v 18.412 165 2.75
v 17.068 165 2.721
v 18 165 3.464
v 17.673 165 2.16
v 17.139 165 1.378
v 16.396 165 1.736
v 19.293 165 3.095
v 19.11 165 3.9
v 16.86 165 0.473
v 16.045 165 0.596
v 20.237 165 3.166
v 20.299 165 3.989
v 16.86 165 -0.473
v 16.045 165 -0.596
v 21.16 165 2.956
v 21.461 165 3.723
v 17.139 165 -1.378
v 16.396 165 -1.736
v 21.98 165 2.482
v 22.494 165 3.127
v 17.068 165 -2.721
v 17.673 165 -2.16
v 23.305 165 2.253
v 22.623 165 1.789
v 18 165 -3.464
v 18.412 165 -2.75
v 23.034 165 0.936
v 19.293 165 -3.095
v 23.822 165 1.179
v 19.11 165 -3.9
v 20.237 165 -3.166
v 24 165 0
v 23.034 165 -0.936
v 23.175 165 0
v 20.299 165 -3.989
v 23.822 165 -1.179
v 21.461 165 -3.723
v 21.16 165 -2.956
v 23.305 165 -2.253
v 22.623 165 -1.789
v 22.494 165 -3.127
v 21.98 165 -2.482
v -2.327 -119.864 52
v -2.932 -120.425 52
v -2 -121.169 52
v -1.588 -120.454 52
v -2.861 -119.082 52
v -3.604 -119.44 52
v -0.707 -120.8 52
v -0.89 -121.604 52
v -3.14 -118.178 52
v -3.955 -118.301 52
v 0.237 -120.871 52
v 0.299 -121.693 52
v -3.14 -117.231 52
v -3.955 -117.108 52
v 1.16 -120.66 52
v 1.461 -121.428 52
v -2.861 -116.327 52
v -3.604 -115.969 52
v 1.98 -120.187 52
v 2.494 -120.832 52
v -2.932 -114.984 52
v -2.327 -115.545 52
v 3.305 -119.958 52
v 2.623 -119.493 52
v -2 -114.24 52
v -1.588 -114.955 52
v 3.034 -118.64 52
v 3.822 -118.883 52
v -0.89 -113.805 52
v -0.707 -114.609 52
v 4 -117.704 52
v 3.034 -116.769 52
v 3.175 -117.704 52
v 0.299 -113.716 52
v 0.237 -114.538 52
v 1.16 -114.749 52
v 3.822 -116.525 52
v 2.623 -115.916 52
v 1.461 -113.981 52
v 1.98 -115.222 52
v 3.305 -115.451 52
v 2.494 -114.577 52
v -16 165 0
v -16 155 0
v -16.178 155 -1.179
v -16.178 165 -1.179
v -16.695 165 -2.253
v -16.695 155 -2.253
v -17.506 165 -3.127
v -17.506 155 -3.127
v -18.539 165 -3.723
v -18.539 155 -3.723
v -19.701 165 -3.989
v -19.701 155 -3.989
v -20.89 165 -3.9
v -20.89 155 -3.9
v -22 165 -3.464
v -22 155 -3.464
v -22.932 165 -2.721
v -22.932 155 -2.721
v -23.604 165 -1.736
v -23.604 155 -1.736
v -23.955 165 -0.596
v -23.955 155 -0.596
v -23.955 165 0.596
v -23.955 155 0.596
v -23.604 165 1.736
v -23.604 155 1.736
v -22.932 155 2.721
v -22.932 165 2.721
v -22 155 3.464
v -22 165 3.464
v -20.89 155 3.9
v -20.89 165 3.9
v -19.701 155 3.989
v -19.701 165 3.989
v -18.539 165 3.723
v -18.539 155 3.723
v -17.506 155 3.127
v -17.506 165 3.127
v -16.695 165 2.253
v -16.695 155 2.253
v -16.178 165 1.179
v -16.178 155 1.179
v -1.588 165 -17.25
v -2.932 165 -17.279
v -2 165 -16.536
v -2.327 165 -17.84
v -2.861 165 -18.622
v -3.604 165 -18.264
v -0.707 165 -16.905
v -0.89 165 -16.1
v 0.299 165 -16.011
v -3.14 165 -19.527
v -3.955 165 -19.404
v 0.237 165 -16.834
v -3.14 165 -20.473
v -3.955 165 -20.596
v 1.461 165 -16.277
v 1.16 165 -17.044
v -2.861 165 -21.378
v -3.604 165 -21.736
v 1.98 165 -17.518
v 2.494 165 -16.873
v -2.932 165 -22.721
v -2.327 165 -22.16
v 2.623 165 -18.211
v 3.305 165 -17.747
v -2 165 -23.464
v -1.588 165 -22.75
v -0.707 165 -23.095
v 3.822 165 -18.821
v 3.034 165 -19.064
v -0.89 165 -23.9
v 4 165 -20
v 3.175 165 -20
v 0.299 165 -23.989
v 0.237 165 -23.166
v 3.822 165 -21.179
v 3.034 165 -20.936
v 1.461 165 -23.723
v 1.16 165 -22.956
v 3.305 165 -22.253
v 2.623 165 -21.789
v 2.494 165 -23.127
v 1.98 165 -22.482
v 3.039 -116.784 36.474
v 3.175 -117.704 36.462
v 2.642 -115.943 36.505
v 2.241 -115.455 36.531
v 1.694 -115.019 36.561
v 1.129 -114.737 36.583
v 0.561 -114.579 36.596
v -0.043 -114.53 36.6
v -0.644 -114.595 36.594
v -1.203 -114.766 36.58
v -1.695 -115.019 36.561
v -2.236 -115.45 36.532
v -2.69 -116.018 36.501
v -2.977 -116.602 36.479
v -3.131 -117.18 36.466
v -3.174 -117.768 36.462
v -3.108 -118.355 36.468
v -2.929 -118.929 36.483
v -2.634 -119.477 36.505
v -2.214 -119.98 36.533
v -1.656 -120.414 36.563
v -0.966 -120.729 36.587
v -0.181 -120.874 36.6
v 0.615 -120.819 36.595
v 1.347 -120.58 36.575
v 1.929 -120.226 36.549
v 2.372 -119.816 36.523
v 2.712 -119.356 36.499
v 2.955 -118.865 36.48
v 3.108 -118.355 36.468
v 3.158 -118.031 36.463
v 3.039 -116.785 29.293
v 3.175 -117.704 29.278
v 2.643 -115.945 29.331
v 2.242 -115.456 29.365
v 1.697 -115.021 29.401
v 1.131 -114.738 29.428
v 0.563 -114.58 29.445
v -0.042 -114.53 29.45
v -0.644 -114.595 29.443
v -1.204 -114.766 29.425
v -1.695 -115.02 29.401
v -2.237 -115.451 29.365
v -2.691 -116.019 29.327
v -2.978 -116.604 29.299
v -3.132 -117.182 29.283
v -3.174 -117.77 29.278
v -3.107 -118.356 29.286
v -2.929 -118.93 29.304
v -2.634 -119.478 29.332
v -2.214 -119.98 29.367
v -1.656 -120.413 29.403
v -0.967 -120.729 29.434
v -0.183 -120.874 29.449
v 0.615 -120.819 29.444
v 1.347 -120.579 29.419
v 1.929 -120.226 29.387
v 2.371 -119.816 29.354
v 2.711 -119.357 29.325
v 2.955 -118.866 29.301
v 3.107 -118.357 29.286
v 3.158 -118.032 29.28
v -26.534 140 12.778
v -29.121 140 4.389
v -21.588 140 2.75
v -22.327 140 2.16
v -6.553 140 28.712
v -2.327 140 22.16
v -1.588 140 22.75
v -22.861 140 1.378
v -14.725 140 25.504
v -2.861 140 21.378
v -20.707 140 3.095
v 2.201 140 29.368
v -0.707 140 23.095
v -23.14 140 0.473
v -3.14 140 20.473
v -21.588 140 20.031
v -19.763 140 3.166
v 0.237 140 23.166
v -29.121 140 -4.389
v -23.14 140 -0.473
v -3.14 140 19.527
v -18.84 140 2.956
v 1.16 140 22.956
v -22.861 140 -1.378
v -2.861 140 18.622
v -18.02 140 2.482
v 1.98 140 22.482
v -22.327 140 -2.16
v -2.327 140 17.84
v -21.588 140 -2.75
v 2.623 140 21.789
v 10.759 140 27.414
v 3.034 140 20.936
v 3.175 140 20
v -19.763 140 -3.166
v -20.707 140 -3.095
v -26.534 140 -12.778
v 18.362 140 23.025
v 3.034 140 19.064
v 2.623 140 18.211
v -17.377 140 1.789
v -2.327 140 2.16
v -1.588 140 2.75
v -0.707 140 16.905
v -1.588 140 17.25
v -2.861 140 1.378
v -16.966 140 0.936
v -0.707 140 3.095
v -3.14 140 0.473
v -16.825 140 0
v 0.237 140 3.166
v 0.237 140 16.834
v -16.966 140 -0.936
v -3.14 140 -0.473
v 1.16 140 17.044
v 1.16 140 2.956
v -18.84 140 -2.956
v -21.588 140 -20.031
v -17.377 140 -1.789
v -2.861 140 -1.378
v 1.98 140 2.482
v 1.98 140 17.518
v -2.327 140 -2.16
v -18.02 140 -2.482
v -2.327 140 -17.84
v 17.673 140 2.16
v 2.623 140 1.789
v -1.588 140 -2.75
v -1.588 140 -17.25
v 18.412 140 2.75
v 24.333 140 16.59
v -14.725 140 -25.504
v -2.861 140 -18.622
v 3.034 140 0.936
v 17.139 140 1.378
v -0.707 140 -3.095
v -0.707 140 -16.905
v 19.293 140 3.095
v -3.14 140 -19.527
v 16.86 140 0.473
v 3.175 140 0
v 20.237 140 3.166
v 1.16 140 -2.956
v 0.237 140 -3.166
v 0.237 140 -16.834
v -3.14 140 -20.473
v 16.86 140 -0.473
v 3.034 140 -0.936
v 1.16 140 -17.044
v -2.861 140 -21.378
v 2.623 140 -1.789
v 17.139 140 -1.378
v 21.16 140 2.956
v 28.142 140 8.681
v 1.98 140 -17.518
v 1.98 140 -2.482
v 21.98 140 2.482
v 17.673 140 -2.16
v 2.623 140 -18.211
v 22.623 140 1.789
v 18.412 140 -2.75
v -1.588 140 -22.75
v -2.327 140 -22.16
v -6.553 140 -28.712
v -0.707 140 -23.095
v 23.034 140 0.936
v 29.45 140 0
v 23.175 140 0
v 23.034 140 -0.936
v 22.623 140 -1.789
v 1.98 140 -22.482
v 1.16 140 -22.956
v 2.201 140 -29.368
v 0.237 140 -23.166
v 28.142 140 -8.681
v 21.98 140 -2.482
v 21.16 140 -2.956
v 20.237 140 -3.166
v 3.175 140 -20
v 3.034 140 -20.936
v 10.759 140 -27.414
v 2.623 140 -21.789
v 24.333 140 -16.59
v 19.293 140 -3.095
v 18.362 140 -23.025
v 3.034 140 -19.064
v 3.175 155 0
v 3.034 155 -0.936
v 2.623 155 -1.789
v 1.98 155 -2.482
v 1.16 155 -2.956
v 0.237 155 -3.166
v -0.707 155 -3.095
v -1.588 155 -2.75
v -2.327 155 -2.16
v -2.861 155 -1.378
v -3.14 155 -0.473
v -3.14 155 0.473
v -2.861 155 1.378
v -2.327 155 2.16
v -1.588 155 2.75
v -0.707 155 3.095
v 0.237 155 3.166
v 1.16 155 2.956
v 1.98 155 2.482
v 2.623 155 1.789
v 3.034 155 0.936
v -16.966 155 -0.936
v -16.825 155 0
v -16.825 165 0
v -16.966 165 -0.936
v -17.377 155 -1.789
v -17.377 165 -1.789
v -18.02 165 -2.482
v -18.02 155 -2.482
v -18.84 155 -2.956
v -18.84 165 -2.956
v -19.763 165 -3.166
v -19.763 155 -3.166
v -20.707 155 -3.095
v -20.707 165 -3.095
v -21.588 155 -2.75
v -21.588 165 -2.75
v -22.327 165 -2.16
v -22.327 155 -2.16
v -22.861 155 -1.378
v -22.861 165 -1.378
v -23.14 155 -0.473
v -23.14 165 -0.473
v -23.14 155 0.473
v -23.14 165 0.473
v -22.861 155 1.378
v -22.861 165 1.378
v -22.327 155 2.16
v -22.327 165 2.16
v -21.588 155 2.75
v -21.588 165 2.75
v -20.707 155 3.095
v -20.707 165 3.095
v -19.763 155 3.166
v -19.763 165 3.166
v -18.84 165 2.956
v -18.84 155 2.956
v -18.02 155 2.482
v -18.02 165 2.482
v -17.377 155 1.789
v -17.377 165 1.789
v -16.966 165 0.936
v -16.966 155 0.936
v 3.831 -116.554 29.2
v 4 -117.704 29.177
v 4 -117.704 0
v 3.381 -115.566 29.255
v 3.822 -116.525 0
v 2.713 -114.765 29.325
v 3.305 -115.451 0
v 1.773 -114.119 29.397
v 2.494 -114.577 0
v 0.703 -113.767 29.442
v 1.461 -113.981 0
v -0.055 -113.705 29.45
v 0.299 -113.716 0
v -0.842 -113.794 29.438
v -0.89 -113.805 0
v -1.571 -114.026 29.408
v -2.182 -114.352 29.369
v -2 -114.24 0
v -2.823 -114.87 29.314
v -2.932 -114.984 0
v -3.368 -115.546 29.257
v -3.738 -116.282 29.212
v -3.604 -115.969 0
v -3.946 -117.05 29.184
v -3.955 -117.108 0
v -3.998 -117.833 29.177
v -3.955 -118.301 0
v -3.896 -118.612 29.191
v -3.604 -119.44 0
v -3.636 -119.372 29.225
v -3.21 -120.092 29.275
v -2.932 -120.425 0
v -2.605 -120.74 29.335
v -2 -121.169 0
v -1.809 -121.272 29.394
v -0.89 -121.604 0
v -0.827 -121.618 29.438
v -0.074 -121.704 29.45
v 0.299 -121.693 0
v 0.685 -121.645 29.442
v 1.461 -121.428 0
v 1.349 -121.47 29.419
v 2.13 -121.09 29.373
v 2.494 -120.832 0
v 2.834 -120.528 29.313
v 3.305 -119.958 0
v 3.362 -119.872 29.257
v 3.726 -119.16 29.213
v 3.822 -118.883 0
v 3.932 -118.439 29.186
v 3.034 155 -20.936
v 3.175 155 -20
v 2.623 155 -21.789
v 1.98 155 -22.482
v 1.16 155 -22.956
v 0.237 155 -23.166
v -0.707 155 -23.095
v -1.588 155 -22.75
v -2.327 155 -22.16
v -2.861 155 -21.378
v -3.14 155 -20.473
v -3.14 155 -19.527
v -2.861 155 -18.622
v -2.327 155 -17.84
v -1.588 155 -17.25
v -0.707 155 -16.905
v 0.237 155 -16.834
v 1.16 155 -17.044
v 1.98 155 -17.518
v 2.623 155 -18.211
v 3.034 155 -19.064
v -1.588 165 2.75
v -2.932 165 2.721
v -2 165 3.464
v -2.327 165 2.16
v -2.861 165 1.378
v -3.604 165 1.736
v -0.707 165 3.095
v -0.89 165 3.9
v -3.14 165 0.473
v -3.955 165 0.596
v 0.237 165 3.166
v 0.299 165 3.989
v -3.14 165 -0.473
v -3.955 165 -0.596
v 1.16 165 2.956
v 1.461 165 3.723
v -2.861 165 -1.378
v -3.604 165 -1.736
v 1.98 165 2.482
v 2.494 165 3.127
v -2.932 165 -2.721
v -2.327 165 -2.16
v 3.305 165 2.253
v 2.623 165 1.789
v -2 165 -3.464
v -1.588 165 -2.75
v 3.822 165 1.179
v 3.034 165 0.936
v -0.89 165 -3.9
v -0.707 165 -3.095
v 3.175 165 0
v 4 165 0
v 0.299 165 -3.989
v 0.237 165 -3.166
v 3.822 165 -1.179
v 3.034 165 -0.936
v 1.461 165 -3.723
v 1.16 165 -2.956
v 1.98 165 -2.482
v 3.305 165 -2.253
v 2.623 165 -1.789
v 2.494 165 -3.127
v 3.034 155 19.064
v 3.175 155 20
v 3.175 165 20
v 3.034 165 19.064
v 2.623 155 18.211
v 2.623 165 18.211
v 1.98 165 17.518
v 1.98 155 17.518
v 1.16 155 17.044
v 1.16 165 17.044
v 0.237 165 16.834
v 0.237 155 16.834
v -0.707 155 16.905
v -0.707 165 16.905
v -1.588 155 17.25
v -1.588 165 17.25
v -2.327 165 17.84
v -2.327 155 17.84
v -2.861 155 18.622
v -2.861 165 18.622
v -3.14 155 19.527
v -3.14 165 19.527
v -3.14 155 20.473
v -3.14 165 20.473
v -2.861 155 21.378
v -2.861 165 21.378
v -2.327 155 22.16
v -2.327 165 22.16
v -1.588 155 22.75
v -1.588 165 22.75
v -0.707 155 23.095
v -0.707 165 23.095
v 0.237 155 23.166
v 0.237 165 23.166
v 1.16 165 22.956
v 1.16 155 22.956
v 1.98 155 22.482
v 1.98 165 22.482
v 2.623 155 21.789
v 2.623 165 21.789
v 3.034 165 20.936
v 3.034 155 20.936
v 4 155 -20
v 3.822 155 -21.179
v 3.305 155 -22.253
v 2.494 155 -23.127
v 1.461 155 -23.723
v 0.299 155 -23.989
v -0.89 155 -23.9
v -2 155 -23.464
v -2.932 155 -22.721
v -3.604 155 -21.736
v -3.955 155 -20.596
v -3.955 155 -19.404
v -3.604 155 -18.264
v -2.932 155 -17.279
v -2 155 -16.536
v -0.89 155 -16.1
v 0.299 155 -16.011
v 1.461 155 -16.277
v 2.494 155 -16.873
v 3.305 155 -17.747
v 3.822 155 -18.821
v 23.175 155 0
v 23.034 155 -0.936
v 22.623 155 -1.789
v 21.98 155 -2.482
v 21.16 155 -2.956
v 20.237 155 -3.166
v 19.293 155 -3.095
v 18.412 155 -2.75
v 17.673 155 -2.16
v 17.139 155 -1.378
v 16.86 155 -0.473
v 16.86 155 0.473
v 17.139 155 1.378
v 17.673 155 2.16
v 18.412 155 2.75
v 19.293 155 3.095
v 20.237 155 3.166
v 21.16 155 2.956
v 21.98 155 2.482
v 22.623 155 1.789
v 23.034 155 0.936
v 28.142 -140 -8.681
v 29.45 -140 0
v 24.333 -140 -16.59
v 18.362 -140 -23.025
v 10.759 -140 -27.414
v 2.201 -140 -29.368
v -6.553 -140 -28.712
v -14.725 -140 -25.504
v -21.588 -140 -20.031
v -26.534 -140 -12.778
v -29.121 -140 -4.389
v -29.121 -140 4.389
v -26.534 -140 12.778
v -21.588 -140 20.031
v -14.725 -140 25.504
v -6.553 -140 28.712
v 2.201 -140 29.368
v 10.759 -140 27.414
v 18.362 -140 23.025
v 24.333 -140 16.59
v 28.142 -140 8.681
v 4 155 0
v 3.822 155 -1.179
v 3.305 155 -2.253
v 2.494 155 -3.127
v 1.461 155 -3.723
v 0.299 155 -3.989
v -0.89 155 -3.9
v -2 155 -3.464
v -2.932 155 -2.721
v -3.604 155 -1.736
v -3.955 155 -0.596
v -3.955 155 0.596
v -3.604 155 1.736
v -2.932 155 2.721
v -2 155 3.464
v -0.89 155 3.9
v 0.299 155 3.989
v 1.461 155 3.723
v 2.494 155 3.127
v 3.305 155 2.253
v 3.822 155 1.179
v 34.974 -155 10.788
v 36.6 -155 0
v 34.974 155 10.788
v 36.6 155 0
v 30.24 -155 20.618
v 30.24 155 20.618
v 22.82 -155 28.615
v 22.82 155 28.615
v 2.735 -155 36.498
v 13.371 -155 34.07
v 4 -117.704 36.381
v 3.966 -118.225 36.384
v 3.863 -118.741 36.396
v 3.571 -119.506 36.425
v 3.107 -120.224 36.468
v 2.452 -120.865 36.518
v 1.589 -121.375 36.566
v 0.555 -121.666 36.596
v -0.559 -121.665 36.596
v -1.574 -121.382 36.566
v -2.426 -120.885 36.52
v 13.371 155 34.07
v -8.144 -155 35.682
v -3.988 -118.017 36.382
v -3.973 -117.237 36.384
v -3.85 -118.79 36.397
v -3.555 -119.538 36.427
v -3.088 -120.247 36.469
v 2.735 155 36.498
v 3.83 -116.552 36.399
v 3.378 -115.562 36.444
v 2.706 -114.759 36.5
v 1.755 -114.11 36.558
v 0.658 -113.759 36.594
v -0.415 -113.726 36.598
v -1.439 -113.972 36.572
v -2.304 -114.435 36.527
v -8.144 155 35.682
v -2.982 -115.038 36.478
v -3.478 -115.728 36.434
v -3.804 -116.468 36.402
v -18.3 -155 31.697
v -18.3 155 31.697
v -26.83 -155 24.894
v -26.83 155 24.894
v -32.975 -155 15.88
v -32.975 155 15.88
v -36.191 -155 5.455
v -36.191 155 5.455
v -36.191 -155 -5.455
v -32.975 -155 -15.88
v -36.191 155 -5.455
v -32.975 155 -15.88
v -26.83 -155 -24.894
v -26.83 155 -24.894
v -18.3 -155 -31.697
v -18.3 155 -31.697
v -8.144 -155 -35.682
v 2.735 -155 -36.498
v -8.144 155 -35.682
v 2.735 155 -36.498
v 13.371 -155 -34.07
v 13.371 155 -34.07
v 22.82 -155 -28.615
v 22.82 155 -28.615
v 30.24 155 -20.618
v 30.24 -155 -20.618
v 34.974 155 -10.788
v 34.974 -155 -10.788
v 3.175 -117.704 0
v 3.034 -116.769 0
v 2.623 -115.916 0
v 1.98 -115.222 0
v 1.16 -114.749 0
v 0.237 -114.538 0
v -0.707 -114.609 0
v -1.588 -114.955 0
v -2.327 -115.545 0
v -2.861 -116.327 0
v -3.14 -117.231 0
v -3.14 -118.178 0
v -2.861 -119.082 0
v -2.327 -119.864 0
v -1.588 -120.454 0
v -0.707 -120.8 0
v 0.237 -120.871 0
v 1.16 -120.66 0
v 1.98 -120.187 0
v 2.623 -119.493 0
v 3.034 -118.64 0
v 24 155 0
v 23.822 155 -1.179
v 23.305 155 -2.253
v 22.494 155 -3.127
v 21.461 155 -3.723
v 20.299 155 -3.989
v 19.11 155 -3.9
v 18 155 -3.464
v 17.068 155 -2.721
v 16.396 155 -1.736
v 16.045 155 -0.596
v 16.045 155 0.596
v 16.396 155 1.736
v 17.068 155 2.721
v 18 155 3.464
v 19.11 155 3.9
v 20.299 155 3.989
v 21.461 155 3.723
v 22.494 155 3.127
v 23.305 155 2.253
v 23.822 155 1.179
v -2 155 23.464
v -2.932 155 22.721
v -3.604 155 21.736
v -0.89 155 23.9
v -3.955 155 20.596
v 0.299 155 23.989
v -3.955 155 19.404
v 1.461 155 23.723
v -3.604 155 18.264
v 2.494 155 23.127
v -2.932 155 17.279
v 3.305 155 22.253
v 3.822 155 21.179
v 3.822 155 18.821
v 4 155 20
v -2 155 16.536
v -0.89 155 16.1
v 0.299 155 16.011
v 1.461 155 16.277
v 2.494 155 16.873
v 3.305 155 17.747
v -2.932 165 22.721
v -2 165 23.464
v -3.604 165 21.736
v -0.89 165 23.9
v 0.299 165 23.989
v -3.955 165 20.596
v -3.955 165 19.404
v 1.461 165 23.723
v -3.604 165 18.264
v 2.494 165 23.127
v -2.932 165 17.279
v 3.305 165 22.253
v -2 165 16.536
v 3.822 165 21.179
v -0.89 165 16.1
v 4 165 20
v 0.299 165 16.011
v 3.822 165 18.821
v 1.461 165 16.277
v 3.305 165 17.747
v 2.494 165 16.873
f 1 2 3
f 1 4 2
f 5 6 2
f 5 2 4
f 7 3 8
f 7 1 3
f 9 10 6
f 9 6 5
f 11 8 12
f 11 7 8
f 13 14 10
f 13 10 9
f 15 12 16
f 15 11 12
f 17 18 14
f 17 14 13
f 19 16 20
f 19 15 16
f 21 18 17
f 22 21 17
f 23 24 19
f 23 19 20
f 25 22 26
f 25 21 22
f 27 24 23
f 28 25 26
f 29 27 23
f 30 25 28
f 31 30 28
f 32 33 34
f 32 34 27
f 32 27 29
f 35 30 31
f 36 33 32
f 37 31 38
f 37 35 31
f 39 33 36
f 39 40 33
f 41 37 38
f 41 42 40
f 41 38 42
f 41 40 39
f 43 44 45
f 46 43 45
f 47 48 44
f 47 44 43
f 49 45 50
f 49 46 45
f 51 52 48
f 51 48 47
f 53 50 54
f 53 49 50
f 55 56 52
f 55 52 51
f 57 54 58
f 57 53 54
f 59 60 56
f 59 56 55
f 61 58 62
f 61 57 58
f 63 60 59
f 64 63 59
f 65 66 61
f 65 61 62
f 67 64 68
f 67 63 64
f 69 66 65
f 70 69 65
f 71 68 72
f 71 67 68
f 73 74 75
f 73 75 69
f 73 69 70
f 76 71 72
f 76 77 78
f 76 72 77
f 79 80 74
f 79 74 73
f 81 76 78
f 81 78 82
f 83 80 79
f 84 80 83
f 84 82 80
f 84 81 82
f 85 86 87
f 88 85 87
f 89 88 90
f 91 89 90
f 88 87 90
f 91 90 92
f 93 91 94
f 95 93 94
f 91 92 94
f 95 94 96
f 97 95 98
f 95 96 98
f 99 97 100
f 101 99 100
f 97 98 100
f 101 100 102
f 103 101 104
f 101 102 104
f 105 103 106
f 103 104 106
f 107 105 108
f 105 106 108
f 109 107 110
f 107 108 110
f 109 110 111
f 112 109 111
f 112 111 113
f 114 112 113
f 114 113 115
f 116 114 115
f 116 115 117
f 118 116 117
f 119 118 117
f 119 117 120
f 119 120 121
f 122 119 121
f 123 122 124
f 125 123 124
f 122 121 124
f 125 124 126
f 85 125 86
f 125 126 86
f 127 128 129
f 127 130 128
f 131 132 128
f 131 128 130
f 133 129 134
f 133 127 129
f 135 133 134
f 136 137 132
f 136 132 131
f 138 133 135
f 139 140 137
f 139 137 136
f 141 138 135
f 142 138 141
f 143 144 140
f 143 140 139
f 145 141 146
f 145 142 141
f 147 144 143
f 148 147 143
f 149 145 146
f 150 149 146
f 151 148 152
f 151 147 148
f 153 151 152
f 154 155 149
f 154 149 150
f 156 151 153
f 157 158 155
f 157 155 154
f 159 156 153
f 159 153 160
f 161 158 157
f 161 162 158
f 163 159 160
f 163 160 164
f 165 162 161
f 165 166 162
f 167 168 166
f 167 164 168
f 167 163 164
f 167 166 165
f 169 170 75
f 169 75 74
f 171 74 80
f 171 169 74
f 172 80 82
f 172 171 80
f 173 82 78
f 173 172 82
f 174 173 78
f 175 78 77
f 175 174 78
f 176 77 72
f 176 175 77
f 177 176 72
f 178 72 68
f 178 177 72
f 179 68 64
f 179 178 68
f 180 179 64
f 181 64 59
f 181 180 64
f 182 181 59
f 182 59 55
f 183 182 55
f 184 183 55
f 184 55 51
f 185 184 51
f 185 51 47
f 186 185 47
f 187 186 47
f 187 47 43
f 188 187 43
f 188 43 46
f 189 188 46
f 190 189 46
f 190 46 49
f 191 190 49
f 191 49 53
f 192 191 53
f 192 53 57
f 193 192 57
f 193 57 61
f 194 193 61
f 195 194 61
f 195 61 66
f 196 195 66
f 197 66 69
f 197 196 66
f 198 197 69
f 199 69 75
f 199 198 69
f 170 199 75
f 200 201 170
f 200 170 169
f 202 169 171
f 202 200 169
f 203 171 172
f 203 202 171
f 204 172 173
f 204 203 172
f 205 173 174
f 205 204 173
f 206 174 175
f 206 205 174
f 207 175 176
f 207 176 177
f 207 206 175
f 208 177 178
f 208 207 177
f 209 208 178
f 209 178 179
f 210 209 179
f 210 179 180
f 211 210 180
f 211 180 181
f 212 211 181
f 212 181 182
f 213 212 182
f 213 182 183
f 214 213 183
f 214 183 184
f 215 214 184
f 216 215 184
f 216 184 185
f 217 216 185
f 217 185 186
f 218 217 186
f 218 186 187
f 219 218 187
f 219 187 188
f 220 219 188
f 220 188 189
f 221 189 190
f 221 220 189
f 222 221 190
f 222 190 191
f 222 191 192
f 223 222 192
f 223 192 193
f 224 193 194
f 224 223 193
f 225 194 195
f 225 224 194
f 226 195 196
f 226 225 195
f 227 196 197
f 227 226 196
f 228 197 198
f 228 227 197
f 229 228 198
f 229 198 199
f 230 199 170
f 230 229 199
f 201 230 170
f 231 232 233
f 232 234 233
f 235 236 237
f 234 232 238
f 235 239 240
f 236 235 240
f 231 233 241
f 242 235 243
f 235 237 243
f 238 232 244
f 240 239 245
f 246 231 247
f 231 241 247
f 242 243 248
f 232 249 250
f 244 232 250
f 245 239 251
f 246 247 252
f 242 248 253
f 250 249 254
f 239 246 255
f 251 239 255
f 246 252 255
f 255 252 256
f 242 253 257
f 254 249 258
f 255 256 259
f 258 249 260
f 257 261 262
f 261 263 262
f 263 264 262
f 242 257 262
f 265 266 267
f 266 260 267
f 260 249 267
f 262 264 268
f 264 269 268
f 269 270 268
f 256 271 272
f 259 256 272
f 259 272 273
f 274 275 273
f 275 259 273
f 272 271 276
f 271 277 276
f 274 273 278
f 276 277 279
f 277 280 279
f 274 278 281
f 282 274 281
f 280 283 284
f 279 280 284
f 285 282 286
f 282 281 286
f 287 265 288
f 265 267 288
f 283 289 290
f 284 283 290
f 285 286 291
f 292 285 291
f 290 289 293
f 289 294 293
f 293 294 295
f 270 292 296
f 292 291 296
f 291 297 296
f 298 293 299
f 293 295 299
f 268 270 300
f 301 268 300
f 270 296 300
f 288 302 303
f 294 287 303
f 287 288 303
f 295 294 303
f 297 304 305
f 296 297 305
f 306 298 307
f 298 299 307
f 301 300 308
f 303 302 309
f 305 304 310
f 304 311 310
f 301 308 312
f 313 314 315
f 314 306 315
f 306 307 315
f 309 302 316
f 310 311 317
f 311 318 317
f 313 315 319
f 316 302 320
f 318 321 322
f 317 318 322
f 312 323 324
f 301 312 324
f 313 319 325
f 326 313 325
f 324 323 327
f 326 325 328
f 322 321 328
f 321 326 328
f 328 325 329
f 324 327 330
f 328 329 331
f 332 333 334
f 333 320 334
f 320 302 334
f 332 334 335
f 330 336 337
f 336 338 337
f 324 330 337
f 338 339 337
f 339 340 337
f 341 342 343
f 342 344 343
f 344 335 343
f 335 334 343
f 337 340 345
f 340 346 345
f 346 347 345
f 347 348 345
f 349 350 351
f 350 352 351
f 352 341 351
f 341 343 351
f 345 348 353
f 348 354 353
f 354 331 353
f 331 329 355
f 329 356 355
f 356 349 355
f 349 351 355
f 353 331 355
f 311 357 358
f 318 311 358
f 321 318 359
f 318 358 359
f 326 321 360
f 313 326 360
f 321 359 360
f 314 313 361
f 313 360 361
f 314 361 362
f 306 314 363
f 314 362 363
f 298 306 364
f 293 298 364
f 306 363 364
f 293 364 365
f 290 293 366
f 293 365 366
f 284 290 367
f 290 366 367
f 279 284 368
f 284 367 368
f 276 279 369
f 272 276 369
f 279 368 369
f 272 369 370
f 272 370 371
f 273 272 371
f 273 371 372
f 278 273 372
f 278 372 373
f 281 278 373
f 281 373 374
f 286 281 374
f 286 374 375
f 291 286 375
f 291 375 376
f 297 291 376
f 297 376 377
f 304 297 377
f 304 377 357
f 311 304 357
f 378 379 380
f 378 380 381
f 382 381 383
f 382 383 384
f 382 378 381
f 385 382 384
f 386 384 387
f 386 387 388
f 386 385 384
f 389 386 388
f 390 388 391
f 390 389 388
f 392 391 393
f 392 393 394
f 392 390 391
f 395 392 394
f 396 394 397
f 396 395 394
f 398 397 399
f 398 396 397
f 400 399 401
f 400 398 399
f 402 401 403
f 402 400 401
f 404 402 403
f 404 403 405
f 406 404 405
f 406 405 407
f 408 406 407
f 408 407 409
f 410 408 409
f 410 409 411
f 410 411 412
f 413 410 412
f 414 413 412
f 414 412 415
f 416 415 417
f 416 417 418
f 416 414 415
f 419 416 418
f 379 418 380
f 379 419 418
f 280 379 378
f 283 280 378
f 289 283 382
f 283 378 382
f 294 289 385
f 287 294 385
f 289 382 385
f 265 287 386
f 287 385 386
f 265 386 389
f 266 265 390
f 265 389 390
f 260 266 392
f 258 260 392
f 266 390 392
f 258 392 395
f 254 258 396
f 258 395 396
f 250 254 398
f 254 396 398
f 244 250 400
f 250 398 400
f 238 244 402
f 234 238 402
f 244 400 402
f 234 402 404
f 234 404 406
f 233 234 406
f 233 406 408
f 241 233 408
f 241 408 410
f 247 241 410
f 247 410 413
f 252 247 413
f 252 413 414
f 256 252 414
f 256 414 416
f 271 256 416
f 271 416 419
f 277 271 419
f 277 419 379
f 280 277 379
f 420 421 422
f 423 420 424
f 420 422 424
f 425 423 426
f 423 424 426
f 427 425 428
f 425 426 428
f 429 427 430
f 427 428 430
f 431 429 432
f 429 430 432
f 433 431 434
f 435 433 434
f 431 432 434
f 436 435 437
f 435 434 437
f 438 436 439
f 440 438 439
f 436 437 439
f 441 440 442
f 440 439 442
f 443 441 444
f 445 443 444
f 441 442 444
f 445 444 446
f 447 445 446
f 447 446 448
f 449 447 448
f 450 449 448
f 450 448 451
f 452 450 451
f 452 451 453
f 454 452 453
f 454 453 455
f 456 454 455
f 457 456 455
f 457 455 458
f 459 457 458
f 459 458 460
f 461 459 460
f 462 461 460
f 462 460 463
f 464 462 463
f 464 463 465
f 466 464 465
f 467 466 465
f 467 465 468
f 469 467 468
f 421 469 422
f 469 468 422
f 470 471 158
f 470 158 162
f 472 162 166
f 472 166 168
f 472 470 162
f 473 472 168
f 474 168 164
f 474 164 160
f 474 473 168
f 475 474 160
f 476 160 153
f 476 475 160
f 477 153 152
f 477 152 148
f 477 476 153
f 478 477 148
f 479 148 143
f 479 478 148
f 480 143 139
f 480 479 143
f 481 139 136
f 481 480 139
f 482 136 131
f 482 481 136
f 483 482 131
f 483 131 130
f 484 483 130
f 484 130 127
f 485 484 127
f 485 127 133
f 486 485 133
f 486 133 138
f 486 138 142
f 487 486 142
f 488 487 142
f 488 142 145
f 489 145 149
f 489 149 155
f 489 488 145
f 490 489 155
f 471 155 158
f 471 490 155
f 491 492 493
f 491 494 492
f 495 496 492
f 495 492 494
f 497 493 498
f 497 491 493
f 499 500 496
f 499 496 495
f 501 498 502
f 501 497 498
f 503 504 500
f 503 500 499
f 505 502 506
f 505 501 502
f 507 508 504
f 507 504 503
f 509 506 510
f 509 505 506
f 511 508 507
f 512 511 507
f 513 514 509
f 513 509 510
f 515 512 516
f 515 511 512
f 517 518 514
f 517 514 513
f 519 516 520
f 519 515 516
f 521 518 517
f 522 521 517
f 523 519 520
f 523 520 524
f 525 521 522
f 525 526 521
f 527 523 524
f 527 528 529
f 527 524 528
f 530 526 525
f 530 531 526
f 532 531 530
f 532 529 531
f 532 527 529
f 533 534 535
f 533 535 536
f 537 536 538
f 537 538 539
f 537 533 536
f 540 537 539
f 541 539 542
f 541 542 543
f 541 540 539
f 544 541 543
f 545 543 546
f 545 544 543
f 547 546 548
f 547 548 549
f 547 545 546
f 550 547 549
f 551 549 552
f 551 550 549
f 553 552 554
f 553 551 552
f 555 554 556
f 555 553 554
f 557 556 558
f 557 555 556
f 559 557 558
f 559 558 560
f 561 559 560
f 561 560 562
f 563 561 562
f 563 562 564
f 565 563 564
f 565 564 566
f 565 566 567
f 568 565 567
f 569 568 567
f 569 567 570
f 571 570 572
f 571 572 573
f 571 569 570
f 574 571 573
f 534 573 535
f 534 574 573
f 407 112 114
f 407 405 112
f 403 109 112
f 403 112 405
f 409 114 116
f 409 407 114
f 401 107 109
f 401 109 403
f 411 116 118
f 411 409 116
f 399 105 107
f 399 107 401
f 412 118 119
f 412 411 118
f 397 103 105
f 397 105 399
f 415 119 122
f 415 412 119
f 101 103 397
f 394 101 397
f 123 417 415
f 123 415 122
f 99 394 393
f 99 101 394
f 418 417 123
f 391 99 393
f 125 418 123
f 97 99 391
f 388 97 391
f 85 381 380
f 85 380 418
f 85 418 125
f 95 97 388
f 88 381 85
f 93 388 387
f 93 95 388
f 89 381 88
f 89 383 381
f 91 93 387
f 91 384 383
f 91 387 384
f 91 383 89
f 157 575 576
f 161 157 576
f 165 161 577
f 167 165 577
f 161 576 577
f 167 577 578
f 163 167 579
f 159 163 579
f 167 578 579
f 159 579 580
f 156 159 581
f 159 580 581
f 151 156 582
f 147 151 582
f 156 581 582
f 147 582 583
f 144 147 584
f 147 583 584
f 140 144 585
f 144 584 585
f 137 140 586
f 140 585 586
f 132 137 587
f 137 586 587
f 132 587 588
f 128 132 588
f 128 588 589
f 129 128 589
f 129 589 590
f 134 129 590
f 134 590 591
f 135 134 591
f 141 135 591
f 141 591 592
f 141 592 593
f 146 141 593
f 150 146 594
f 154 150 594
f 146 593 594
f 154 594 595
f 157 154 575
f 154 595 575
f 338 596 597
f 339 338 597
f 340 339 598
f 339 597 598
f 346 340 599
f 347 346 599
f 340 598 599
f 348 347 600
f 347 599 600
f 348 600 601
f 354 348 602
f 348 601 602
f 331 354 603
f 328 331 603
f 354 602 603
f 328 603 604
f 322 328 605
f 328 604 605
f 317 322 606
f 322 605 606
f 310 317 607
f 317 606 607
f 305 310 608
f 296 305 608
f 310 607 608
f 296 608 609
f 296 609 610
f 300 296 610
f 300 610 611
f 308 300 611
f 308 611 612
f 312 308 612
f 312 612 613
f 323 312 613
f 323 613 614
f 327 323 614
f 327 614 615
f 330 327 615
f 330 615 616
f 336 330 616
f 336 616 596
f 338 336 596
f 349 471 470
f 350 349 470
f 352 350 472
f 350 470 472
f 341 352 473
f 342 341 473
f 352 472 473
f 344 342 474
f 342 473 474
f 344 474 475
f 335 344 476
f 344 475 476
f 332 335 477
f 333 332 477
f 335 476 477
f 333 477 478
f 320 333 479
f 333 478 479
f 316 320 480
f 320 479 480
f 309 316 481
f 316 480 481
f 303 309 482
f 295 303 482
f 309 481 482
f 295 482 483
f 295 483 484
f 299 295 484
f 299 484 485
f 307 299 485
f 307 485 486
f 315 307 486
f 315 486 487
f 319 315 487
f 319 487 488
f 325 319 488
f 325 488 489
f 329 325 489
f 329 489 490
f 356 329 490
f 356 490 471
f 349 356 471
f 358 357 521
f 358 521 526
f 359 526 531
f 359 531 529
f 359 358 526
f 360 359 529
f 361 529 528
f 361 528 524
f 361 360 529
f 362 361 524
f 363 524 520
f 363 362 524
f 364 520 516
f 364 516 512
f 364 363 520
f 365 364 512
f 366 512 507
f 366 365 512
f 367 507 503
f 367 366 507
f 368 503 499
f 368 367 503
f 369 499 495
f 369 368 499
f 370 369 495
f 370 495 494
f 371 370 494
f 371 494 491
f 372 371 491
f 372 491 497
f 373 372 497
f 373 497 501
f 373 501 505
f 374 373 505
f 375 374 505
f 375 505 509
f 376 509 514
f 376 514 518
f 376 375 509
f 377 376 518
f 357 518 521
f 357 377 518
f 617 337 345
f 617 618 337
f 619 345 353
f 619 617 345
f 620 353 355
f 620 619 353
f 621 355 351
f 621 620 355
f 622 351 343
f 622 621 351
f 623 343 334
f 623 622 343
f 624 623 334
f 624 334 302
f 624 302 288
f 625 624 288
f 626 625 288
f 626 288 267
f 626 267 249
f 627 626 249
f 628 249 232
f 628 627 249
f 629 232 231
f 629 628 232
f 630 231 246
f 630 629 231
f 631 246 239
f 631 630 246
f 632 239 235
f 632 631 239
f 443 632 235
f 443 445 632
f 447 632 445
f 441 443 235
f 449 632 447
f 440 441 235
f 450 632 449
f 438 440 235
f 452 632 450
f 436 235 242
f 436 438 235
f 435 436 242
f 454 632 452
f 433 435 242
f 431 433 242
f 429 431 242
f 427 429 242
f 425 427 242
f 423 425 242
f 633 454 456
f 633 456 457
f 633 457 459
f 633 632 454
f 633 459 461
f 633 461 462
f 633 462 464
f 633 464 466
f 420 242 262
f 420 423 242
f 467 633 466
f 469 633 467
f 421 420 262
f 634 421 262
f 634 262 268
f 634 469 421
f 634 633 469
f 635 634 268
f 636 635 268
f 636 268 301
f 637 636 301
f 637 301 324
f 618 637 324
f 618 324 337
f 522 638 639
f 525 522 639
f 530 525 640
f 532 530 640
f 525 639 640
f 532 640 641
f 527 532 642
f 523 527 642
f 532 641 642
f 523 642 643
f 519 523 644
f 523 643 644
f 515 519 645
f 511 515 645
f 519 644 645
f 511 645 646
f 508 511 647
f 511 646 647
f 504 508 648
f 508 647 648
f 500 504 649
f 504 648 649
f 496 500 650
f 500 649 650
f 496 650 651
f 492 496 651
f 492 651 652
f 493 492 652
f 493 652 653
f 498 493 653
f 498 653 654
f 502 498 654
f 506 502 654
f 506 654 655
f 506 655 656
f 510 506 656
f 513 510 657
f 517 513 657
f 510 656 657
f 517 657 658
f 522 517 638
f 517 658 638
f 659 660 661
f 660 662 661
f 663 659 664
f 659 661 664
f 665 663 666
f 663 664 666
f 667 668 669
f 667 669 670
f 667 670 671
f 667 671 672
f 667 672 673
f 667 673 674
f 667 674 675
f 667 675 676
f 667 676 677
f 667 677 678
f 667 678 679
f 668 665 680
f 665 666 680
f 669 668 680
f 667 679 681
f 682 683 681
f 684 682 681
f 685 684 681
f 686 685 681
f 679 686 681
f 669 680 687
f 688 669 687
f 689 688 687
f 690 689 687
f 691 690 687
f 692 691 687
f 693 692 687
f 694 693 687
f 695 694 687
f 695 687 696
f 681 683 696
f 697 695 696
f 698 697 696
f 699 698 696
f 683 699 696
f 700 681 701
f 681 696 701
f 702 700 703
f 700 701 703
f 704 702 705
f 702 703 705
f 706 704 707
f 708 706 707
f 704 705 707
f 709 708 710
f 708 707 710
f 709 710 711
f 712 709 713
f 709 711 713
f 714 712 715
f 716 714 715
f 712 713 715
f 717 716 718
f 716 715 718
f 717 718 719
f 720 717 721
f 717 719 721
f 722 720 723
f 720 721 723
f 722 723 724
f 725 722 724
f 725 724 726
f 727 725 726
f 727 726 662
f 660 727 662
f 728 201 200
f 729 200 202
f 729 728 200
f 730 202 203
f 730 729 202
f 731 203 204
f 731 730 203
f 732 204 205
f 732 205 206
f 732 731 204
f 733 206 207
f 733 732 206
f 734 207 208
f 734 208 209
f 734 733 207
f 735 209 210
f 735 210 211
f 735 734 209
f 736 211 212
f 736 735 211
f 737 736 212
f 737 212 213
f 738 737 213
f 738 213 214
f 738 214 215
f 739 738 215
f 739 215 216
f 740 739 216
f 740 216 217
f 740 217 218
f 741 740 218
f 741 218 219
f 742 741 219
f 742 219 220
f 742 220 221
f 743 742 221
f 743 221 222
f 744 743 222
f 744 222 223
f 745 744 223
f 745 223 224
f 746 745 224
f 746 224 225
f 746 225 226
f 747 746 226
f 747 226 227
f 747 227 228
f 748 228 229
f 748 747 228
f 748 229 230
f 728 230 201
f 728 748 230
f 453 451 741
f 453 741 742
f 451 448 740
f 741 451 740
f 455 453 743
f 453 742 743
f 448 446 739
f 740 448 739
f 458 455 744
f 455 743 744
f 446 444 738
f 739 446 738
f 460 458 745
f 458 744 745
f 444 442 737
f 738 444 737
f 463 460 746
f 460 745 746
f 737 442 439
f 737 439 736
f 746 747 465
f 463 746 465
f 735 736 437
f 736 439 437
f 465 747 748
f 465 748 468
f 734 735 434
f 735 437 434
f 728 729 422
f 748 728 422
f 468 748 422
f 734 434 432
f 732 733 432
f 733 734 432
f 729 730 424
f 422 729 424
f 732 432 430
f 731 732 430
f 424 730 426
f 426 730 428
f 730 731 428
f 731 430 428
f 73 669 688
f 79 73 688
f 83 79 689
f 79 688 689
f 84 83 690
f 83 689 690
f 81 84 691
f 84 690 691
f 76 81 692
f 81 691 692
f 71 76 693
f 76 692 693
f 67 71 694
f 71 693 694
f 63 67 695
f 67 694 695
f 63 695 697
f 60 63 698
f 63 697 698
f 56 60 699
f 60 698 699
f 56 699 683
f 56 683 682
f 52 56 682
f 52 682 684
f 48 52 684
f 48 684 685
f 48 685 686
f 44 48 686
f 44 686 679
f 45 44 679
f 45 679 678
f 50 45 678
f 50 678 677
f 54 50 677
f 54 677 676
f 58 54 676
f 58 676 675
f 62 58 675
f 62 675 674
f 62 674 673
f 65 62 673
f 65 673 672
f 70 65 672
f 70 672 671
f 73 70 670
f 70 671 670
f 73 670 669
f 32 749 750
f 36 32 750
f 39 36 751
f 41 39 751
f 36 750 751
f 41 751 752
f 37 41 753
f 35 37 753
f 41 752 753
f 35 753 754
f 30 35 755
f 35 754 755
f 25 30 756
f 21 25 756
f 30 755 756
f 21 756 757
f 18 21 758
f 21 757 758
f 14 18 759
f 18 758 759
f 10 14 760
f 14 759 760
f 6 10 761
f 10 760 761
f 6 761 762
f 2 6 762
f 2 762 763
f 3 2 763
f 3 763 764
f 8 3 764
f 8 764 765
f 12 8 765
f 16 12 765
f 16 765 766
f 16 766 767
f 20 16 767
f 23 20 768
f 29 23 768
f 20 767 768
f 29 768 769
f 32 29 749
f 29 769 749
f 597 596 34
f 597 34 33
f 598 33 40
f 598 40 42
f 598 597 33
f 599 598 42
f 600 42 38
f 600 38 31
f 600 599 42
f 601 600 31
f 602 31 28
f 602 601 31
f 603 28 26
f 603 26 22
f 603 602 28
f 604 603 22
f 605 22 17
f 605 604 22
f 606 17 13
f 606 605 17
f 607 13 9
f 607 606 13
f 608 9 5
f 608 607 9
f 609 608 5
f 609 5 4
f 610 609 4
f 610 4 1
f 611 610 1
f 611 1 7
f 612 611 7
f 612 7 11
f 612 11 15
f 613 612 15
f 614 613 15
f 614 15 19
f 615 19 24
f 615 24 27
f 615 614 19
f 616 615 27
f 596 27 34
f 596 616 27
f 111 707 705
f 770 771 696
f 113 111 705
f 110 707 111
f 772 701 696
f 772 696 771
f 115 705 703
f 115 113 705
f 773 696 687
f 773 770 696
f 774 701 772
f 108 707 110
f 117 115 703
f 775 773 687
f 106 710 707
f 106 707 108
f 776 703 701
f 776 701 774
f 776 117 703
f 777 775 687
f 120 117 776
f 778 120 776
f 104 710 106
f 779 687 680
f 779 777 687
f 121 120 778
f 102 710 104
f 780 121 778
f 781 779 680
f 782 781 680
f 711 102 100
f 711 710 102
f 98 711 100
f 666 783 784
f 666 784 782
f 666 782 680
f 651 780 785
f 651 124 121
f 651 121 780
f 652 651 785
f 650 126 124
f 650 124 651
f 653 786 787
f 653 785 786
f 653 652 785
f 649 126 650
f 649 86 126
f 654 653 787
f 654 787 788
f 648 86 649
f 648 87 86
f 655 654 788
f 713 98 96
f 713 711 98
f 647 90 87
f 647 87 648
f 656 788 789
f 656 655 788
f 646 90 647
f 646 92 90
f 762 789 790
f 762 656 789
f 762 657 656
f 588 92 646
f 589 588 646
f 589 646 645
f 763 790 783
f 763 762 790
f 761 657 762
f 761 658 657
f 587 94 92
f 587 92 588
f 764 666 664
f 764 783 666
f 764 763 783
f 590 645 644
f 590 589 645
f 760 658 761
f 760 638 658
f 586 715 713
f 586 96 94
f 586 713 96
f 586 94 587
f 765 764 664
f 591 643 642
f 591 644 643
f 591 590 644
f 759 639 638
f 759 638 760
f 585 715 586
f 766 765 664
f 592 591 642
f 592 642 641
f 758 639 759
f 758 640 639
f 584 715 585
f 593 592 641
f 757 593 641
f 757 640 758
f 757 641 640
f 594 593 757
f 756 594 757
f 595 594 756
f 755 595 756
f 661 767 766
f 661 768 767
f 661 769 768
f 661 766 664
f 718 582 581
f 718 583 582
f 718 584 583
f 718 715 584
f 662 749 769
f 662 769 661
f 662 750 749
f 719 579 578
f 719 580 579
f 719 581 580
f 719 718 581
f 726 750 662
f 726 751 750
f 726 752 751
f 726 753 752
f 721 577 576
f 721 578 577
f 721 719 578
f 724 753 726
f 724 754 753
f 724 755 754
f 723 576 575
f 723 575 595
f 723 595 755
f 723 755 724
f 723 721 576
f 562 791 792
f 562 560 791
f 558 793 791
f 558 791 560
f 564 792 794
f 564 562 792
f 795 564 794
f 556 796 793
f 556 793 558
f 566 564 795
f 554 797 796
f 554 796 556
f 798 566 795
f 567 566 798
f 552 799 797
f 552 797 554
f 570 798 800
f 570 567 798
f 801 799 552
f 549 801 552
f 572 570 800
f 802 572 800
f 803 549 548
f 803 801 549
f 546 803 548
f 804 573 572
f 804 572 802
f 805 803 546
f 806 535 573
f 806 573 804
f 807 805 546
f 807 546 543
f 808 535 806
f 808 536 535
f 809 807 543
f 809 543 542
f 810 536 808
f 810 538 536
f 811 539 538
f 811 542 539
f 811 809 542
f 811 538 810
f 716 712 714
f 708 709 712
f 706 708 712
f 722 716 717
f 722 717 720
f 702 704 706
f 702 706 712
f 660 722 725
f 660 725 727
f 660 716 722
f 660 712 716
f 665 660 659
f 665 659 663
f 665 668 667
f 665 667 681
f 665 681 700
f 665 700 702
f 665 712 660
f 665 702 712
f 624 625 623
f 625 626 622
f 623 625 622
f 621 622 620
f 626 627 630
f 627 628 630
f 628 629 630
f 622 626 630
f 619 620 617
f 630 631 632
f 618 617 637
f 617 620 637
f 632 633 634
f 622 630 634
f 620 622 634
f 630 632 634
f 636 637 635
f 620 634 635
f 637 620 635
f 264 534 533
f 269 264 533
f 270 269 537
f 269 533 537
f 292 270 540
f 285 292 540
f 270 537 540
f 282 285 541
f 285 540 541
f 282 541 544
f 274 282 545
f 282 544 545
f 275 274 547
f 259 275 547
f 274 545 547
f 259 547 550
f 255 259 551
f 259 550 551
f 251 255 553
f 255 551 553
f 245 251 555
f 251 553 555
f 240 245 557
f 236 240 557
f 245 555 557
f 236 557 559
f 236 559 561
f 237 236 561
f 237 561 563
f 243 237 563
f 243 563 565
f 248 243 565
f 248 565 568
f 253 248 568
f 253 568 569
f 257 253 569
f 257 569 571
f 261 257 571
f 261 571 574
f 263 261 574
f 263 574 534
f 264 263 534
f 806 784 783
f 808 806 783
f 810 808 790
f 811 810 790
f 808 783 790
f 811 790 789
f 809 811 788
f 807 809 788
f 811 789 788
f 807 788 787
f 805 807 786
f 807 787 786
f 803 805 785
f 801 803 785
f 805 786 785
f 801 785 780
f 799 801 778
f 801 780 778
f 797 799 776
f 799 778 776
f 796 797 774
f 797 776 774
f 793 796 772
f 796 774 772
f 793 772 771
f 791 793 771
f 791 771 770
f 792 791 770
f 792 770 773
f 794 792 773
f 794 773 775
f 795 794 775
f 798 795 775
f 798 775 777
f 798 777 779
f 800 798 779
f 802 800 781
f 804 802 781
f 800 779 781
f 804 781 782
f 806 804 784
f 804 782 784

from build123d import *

# Parameters (mm, degrees)
SKETCH2_R           = 36.6
SKETCH2_R_2         = 29.45
BOSS_EXTRUDE1_DEPTH = 140
SKETCH3_R           = 36.6
BOSS_EXTRUDE2_DEPTH = 15
SKETCH5_R           = 3.175
CUT_EXTRUDE1_DEPTH  = 52
SKETCH6_R           = 4
SKETCH6_R_2         = 3.175
BOSS_EXTRUDE4_DEPTH = 52
SKETCH7_R           = 3.175
CUT_EXTRUDE2_DEPTH  = 52
SKETCH8_R           = 4
SKETCH8_R_2         = 3.175
BOSS_EXTRUDE5_DEPTH = 10
SKETCH4_R           = 36.6
BOSS_EXTRUDE3_DEPTH = 15


with BuildPart() as part:
    # Sketch2 → Boss-Extrude1 (new body, symmetric)
    with BuildSketch(Plane(origin=(0, 0, 0), x_dir=(1, 0, 0), z_dir=(0, 1, 0))):
        Circle(SKETCH2_R)
        Circle(SKETCH2_R_2, mode=Mode.SUBTRACT)
    extrude(amount=BOSS_EXTRUDE1_DEPTH, both=True)

    # Sketch3 → Boss-Extrude2 (add)
    with BuildSketch(Plane(origin=(0, 140, 0), x_dir=(1, 0, 0), z_dir=(0, 1, 0))):
        Circle(SKETCH3_R)
    extrude(amount=BOSS_EXTRUDE2_DEPTH)

    # Sketch5 → Cut-Extrude1 (cut)
    with BuildSketch(Plane.XY):
        with Locations((0, -117.704465643)):
            Circle(SKETCH5_R)
    extrude(amount=CUT_EXTRUDE1_DEPTH, mode=Mode.SUBTRACT)

    # Sketch6 → Boss-Extrude4 (add)
    with BuildSketch(Plane.XY):
        with Locations((0, -117.704465643)):
            Circle(SKETCH6_R)
        with Locations((0, -117.704465643)):
            Circle(SKETCH6_R_2, mode=Mode.SUBTRACT)
    extrude(amount=BOSS_EXTRUDE4_DEPTH)

    # Sketch7 → Cut-Extrude2 (cut)
    with BuildSketch(Plane(origin=(0, 155, 0), x_dir=(1, 0, 0), z_dir=(0, 1, 0))):
        with Locations((0, 20)):
            Circle(SKETCH7_R)
        Circle(SKETCH7_R)
        with Locations((-20, 0)):
            Circle(SKETCH7_R)
        with Locations((20, 0)):
            Circle(SKETCH7_R)
        with Locations((0, -20)):
            Circle(SKETCH7_R)
    extrude(amount=-CUT_EXTRUDE2_DEPTH, mode=Mode.SUBTRACT)

    # Sketch8 → Boss-Extrude5 (add)
    with BuildSketch(Plane(origin=(0, 155, 0), x_dir=(1, 0, 0), z_dir=(0, 1, 0))):
        Circle(SKETCH8_R)
        Circle(SKETCH8_R_2, mode=Mode.SUBTRACT)
        with Locations((0, 20)):
            Circle(SKETCH8_R)
        with Locations((0, 20)):
            Circle(SKETCH8_R_2, mode=Mode.SUBTRACT)
        with Locations((20, 0)):
            Circle(SKETCH8_R)
        with Locations((20, 0)):
            Circle(SKETCH8_R_2, mode=Mode.SUBTRACT)
        with Locations((-20, 0)):
            Circle(SKETCH8_R)
        with Locations((-20, 0)):
            Circle(SKETCH8_R_2, mode=Mode.SUBTRACT)
        with Locations((0, -20)):
            Circle(SKETCH8_R)
        with Locations((0, -20)):
            Circle(SKETCH8_R_2, mode=Mode.SUBTRACT)
    extrude(amount=BOSS_EXTRUDE5_DEPTH)

    # Sketch4 → Boss-Extrude3 (add)
    with BuildSketch(Plane.XZ.offset(140)):
        Circle(SKETCH4_R)
    extrude(amount=BOSS_EXTRUDE3_DEPTH)


solid = part.part
